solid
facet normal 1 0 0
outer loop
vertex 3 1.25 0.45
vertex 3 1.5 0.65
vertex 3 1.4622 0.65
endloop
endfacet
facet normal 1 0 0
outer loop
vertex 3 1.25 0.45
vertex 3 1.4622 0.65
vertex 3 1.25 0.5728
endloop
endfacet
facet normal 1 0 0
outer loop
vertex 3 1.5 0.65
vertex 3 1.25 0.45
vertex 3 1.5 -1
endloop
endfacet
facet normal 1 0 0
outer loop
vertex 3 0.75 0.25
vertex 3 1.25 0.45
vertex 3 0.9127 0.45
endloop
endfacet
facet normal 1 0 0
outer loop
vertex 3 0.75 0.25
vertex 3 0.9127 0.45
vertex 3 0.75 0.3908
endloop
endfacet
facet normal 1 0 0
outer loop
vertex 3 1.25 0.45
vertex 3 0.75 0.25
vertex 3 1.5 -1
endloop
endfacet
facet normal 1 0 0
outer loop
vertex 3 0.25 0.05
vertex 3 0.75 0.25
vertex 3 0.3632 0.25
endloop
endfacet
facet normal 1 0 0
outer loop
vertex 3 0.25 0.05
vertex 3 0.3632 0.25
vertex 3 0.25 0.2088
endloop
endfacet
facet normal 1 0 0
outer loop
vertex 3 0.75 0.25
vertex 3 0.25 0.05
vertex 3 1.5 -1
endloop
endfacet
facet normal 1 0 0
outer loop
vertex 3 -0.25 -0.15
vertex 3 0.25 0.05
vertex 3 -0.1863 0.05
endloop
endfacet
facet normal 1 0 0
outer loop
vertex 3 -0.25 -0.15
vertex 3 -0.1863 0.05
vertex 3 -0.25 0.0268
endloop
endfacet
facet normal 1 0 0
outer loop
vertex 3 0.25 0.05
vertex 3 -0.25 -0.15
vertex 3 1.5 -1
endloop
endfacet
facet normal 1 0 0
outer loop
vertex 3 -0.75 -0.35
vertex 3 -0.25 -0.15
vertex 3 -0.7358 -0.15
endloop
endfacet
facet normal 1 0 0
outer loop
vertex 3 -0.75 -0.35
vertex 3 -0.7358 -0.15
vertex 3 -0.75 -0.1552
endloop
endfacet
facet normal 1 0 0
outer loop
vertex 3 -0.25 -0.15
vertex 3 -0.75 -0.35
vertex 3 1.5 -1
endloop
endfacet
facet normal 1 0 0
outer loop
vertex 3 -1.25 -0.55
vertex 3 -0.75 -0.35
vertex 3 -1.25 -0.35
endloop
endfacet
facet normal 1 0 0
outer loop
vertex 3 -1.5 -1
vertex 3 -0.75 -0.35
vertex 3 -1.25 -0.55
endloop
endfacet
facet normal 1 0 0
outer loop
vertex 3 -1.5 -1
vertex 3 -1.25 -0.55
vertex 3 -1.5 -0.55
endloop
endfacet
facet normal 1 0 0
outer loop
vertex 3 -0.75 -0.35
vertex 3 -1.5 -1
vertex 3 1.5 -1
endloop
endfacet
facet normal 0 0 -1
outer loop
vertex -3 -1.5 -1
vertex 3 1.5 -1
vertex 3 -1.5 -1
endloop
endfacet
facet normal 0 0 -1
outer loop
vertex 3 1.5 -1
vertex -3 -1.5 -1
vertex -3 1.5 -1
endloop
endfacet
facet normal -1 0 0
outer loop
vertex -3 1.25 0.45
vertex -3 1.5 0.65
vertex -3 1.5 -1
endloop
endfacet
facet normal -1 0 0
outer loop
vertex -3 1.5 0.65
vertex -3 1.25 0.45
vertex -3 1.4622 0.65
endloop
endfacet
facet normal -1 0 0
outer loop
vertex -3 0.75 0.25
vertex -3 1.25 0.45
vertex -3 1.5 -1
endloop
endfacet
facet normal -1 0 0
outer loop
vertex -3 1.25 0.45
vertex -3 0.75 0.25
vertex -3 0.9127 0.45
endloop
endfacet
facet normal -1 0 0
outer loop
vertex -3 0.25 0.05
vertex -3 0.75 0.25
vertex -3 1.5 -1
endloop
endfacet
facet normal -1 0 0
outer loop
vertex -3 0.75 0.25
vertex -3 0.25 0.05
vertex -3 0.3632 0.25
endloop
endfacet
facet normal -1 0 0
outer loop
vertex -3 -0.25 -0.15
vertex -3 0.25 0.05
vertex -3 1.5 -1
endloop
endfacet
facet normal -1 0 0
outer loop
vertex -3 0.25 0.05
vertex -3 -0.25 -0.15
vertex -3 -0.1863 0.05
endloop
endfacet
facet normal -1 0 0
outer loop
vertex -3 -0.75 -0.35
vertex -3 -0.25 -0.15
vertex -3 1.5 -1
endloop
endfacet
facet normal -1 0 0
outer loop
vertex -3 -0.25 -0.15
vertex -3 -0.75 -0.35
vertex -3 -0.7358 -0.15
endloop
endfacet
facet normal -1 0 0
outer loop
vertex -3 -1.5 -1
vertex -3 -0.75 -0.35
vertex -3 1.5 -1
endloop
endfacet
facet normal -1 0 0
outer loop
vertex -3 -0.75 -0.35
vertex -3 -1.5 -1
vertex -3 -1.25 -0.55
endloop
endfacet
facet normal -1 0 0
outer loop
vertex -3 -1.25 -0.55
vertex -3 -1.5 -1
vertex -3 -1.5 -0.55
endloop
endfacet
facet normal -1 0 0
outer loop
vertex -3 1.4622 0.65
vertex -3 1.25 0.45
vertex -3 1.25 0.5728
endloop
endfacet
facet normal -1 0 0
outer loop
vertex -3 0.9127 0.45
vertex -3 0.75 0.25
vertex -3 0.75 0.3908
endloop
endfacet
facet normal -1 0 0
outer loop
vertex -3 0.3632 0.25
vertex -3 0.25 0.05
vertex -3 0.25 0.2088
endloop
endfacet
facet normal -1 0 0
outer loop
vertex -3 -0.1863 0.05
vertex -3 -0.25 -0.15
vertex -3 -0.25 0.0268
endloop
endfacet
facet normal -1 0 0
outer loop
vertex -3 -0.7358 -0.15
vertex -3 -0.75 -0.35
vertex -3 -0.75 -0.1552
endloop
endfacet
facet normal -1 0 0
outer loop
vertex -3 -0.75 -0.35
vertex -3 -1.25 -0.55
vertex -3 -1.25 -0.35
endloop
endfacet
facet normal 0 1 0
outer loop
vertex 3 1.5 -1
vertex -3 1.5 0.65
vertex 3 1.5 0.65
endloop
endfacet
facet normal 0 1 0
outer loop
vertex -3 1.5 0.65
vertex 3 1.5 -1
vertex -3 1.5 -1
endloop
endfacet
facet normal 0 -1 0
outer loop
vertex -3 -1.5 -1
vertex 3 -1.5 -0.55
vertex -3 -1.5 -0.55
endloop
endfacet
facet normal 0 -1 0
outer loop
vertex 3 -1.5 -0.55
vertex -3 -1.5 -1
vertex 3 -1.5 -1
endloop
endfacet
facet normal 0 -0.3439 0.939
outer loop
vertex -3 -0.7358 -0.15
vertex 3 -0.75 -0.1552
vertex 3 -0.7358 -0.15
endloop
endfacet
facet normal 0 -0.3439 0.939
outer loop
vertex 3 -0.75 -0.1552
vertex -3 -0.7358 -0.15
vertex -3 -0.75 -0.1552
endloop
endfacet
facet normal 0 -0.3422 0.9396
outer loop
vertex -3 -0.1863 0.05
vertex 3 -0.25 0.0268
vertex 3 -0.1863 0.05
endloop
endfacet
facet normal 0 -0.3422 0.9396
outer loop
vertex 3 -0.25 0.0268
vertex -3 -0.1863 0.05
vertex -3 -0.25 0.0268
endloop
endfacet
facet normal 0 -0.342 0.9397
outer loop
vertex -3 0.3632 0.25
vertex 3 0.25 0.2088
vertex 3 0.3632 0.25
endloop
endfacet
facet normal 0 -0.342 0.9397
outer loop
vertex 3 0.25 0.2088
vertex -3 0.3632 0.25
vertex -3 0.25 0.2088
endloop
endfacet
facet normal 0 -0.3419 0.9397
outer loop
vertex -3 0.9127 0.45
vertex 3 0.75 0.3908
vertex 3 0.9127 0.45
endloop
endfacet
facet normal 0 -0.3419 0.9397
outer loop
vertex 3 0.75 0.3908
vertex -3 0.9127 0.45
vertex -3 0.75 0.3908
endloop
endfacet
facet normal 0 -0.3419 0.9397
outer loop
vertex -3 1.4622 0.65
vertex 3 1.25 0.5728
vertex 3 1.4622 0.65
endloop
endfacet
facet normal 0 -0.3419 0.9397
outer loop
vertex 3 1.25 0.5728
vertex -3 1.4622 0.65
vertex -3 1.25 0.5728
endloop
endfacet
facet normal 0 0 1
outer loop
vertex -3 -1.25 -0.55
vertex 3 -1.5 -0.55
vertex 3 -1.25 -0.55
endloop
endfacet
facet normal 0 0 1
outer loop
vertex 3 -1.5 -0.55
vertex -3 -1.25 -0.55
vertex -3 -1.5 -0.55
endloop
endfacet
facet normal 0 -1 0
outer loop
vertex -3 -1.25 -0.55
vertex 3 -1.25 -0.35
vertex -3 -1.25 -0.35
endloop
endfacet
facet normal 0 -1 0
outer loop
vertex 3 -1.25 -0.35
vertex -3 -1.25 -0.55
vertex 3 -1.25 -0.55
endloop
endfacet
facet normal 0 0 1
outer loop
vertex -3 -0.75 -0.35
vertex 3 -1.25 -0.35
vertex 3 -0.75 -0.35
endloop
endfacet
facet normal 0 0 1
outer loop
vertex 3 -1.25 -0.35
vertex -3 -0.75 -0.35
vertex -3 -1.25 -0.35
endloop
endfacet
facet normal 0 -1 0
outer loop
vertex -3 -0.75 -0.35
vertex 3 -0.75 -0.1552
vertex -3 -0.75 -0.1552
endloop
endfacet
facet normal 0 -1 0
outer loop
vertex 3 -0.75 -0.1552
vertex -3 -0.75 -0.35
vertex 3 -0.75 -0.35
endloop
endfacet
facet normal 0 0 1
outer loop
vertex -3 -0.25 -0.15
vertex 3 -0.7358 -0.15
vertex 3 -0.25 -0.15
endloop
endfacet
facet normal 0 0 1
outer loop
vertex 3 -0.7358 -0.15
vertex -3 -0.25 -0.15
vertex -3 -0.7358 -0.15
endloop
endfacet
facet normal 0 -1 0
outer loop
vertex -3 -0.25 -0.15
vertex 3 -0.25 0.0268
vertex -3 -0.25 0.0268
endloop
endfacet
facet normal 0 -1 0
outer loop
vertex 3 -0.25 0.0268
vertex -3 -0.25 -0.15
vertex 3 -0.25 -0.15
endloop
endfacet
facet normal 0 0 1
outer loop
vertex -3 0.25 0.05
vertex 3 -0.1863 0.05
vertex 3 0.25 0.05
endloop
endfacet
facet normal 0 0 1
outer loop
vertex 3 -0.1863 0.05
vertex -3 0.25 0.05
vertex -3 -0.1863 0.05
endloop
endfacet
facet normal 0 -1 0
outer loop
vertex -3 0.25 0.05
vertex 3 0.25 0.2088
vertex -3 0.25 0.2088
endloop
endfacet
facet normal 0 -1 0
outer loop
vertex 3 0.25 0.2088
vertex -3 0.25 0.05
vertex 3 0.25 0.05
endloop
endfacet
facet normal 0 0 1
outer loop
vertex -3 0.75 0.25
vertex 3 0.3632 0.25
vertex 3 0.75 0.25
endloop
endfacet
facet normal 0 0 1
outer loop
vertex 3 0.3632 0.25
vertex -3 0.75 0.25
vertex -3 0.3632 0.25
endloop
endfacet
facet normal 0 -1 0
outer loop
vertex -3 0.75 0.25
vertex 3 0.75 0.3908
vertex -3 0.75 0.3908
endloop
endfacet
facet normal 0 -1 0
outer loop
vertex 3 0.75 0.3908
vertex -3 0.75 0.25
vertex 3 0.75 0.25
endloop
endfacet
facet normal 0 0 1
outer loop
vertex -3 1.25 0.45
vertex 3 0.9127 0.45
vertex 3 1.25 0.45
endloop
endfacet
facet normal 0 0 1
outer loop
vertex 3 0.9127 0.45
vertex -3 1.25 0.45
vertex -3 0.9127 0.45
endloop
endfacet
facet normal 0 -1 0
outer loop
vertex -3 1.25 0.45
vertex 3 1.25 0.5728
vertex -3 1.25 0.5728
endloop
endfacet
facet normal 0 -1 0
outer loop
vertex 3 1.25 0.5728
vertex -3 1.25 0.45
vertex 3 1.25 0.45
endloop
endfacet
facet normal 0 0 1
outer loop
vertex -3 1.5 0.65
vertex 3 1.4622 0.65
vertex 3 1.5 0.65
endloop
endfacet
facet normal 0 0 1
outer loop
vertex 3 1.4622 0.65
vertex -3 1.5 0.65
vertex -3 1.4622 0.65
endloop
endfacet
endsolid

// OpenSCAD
difference(){
    difference(){
        cube([6,3,2], center=true);
        translate([0,-0.5,1])rotate([20,0,0]) cube([7,4,2], center=true);
    }
    translate([0,-1.5,-0.3])cube([9,0.5,0.5], center=true);
    translate([0,-1.0,-0.1])cube([9,0.5,0.5], center=true);
    translate([0,-0.5,0.1])cube([9,0.5,0.5], center=true);
    translate([0,-0.0,0.3])cube([9,0.5,0.5], center=true);
    translate([0,0.5,0.5])cube([9,0.5,0.5], center=true);
    translate([0,1,0.7])cube([9,0.5,0.5], center=true);
     translate([0,1.5,0.9])cube([9,0.5,0.5], center=true);
}
